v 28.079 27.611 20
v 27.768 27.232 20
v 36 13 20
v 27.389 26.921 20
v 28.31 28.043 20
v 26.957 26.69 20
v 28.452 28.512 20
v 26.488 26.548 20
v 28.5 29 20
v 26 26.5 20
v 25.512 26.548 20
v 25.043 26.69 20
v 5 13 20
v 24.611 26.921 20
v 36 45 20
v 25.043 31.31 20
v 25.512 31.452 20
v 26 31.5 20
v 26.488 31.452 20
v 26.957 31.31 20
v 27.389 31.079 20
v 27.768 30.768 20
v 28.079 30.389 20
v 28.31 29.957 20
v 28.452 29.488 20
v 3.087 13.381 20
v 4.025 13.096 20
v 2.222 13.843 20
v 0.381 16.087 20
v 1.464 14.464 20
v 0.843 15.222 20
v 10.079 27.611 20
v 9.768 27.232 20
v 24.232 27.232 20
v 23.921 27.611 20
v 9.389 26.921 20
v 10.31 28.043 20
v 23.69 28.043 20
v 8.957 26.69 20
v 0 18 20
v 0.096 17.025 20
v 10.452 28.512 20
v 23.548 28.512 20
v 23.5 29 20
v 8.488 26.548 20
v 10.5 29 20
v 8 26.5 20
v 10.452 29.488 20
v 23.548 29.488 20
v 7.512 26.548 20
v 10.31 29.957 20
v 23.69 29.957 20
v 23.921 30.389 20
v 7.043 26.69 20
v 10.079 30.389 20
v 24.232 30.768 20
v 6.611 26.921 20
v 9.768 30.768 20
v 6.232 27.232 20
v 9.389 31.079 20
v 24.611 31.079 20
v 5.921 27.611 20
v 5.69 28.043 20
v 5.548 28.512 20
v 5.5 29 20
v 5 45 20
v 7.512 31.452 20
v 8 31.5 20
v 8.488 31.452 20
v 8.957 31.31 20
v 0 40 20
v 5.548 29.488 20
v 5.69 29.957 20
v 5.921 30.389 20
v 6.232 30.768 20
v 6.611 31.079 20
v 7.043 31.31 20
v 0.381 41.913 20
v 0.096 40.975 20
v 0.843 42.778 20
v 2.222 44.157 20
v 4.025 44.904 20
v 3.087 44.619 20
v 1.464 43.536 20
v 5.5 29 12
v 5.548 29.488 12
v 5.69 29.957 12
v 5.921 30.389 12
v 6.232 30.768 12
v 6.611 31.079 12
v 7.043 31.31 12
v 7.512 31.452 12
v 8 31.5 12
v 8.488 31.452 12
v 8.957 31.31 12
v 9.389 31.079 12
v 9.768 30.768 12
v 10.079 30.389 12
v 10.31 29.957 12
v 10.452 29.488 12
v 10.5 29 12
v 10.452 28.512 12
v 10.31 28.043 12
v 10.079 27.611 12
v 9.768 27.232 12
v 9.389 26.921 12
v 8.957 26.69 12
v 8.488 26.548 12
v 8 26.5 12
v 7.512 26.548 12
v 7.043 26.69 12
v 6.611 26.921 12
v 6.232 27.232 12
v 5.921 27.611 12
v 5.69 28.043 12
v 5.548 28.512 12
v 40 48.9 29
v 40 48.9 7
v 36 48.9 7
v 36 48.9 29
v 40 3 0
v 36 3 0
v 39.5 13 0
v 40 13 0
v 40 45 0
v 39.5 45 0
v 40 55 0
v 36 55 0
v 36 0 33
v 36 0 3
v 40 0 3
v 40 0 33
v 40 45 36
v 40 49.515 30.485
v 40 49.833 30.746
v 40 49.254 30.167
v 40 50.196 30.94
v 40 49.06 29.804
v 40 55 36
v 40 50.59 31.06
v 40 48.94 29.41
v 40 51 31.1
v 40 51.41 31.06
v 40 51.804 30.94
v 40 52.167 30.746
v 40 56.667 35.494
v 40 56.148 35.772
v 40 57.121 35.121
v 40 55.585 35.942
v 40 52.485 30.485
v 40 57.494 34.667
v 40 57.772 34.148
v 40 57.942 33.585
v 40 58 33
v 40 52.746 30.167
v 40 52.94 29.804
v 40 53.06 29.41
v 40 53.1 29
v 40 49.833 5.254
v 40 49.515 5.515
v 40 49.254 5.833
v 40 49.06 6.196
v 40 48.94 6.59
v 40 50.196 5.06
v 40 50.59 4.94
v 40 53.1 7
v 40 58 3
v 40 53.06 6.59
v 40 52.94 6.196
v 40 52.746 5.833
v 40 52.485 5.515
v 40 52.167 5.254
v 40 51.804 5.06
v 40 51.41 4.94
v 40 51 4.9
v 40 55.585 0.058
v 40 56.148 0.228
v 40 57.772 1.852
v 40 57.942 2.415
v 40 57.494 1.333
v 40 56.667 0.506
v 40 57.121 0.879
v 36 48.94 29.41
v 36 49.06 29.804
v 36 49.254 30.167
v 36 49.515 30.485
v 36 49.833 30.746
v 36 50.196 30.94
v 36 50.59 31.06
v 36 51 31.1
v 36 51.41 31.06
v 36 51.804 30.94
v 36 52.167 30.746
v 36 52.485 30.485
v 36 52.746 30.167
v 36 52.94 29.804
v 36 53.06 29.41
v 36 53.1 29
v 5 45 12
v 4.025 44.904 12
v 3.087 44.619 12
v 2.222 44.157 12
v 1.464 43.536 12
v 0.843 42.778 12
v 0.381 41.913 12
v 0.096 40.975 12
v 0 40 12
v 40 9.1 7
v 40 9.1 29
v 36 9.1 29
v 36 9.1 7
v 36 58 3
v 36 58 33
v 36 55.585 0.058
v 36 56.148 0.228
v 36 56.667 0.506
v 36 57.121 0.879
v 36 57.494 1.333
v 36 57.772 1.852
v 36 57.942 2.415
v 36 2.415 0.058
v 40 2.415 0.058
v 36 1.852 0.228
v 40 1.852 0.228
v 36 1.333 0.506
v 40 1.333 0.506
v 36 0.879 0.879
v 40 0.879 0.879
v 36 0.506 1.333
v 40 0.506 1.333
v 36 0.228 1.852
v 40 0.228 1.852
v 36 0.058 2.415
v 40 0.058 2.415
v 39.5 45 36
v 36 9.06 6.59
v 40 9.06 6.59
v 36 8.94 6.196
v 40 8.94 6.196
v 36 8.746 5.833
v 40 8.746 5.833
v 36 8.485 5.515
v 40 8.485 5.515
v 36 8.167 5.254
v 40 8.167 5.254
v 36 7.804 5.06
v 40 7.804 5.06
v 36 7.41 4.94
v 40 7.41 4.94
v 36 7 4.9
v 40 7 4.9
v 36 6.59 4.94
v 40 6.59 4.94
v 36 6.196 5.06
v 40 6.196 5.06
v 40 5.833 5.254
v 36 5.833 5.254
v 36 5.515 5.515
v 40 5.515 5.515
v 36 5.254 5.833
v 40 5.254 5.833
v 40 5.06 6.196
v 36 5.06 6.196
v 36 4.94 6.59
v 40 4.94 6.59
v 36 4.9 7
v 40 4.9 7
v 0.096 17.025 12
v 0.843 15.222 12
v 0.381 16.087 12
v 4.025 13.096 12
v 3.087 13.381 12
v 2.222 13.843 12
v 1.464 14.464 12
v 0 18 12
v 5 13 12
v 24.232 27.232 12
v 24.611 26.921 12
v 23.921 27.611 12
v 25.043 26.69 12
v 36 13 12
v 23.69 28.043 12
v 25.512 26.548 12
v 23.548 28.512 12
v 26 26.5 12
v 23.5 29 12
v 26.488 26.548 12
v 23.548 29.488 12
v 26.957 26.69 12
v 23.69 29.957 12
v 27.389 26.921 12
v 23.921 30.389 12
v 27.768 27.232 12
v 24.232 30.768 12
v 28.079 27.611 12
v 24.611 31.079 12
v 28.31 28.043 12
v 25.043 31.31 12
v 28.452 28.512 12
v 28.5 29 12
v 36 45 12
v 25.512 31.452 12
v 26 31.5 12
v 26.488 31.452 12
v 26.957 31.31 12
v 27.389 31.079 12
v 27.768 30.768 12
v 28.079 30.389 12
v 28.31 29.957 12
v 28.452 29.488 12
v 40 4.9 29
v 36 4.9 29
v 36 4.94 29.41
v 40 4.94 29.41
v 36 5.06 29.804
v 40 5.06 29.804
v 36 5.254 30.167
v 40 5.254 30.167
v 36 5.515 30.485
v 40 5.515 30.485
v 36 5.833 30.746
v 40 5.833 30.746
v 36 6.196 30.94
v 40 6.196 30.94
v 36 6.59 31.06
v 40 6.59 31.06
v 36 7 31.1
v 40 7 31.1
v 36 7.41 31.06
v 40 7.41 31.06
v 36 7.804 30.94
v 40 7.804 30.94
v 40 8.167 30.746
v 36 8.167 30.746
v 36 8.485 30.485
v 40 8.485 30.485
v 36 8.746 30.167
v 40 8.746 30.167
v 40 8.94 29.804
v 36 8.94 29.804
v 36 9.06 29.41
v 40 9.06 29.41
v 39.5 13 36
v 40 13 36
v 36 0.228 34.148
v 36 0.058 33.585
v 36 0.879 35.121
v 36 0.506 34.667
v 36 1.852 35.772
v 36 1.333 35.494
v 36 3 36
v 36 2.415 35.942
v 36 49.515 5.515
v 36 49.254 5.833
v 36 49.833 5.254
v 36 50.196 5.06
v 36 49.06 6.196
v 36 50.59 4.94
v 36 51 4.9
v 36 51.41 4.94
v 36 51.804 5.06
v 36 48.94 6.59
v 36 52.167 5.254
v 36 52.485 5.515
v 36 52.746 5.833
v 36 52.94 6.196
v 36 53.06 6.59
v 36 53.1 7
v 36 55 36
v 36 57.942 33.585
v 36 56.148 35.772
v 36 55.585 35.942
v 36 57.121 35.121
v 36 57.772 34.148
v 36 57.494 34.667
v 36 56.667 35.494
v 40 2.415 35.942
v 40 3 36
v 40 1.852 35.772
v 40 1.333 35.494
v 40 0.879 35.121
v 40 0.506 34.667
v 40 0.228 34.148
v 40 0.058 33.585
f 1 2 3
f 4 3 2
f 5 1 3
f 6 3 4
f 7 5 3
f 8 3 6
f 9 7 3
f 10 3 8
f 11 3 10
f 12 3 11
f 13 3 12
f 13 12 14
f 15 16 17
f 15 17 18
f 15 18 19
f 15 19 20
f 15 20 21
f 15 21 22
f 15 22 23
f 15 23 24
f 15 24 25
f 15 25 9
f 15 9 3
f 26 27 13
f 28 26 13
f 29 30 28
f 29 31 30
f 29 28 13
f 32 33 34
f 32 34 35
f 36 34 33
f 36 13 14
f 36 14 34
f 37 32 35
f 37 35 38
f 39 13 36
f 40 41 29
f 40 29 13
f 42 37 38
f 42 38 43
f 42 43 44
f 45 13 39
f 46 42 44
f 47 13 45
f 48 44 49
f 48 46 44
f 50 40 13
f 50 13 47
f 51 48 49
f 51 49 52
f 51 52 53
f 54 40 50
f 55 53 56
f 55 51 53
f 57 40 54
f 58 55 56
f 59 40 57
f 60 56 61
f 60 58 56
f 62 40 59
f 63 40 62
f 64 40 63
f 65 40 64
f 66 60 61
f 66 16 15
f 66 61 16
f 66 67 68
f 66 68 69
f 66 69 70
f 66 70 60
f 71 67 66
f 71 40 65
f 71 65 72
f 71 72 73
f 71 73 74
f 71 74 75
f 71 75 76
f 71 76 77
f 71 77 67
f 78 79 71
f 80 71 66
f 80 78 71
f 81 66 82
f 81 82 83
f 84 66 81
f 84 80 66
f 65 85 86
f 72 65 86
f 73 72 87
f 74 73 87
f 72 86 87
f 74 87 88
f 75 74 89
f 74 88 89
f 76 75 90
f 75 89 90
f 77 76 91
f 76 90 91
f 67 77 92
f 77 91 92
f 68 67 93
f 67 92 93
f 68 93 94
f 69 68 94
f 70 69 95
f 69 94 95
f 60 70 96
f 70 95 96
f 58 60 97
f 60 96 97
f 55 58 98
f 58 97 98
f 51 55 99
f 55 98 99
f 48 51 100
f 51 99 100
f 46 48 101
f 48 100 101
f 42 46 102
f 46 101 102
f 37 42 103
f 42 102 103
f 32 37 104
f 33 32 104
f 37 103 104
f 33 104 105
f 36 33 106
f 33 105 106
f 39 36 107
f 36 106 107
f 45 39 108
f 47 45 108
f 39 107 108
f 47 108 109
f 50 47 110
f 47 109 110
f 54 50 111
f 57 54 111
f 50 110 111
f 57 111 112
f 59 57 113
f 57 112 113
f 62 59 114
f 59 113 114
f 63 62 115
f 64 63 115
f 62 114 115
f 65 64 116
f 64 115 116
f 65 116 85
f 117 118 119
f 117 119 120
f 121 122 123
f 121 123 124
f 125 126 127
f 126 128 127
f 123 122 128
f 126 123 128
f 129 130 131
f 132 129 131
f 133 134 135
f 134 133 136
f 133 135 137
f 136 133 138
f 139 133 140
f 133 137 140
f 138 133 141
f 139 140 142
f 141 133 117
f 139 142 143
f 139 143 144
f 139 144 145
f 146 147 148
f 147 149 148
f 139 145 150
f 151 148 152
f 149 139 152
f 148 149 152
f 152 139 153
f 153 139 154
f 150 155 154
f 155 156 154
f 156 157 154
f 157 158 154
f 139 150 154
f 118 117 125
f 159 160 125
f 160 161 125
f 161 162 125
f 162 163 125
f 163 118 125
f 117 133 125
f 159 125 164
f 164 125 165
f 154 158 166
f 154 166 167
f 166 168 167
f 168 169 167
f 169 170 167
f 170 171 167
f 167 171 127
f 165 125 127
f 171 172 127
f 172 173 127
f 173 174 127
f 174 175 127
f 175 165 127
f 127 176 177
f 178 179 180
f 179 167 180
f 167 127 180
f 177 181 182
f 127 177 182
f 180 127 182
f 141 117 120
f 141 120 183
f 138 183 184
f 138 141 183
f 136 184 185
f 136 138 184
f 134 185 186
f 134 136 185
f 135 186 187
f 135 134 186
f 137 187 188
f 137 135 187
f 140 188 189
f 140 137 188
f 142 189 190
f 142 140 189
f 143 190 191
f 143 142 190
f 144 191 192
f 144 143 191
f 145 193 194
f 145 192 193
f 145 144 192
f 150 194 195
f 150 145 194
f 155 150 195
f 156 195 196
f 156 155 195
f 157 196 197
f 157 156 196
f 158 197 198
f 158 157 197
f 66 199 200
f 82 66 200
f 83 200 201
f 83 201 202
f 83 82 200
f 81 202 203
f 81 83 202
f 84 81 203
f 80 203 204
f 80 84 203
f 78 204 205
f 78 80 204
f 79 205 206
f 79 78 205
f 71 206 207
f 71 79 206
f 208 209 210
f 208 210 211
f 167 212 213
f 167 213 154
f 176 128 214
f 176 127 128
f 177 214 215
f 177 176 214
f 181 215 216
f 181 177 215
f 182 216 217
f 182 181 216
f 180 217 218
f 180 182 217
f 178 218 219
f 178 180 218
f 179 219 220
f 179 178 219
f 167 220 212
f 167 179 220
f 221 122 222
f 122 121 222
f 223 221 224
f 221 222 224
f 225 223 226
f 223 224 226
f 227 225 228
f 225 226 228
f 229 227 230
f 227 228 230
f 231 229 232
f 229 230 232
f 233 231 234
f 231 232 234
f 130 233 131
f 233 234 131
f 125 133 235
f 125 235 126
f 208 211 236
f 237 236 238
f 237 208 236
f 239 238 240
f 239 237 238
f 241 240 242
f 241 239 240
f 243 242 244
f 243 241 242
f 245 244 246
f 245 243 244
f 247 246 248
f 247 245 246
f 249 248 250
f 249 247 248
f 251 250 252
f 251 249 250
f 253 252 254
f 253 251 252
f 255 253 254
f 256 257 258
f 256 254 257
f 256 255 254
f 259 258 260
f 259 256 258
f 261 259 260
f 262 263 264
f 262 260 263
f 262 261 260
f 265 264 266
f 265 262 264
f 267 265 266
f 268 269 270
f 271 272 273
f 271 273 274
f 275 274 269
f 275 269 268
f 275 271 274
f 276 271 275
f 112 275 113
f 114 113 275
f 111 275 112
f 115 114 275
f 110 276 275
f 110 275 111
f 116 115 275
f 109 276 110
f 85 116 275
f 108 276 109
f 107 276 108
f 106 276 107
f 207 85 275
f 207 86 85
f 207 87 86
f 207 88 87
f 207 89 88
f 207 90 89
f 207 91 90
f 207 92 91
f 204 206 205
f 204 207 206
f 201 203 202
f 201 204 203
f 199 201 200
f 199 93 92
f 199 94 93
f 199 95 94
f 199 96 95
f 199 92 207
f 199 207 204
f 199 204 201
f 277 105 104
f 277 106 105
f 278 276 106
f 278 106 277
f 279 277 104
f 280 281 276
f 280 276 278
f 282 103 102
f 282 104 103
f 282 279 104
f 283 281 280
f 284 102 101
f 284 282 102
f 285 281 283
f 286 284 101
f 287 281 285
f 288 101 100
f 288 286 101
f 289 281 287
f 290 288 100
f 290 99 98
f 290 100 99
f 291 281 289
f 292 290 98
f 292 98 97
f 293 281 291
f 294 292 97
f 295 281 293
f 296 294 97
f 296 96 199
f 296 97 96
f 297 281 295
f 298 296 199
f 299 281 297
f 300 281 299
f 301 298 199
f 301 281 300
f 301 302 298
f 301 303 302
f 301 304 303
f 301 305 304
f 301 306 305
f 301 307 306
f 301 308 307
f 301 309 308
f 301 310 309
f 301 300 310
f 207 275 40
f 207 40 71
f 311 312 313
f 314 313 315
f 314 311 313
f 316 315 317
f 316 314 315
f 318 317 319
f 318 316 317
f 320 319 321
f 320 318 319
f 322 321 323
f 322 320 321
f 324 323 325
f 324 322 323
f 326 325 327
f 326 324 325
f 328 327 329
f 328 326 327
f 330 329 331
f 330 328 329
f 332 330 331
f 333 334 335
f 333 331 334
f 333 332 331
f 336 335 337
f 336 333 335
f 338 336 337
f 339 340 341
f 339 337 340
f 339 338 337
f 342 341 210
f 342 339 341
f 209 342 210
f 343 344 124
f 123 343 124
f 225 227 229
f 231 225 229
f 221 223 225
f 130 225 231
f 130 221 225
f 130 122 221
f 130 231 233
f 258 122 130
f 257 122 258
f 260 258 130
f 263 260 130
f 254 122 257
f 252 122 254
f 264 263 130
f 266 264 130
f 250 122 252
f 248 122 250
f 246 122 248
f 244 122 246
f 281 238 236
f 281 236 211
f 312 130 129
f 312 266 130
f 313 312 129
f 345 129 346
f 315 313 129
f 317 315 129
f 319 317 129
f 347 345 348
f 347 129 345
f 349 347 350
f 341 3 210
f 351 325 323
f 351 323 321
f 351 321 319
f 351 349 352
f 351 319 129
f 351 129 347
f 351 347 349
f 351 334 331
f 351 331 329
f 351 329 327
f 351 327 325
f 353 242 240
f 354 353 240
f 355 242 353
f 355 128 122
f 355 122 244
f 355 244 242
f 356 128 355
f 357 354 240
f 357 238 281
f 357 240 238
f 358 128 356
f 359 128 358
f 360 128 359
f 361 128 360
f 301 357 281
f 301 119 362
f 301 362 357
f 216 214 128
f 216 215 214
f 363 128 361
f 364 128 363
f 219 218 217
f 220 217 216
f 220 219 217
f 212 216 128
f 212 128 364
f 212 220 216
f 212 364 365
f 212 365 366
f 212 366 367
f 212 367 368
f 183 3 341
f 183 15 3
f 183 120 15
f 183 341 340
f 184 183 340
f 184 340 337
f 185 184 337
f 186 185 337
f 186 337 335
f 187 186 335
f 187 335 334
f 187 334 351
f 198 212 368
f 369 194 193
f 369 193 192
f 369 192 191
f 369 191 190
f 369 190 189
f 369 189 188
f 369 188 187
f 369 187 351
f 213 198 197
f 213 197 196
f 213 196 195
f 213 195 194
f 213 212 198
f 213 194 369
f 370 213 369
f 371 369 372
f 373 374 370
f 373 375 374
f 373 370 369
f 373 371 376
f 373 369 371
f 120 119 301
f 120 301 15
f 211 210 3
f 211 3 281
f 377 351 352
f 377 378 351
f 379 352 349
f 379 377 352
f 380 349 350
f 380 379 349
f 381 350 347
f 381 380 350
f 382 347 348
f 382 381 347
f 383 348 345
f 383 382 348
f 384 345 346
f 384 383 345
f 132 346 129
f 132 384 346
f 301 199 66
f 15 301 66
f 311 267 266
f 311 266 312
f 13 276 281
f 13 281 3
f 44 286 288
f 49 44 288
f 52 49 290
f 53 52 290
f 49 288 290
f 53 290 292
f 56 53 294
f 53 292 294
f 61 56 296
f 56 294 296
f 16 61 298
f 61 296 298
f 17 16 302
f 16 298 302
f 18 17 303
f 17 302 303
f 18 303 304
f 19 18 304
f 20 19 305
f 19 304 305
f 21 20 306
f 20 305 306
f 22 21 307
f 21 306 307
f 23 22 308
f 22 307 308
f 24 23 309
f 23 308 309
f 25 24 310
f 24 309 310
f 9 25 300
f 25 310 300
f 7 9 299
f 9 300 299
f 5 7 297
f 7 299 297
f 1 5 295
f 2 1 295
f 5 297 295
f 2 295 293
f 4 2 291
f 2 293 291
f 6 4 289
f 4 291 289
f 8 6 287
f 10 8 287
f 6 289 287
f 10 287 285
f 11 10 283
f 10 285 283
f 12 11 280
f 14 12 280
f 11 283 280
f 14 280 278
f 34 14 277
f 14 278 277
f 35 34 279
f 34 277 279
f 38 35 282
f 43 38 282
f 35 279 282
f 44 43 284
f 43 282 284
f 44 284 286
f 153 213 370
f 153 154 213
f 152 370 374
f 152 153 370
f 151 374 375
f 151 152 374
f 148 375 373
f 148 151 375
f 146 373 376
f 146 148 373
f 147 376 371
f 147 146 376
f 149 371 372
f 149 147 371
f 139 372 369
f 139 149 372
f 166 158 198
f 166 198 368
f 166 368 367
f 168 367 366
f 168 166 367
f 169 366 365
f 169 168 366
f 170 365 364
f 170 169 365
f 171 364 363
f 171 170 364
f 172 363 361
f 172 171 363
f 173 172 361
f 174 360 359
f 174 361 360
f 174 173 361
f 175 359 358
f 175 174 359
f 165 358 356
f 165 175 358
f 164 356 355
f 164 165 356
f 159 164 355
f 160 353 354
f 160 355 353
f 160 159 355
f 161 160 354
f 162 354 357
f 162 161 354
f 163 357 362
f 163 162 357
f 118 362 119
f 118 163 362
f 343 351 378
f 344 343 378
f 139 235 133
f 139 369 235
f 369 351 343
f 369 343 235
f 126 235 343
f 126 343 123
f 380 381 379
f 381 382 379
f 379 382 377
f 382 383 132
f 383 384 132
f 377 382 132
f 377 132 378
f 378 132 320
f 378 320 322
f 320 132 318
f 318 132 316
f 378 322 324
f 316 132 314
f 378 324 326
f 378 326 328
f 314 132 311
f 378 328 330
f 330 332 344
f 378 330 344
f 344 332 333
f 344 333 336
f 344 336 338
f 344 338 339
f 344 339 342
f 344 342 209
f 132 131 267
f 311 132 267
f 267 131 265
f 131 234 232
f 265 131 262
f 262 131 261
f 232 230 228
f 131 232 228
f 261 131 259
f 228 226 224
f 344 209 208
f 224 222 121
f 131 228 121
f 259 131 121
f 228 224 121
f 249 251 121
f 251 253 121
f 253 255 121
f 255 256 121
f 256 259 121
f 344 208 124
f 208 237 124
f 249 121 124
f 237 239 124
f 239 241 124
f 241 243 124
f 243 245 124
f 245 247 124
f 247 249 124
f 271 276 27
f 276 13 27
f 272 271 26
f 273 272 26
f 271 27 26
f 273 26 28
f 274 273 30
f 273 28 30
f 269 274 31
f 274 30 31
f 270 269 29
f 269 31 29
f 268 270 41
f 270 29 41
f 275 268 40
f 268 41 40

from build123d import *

# Parameters (mm, degrees)
SKETCH_1_W             = 40
SKETCH_1_H             = 58
EXTRUDE_2_DEPTH        = 36
SKETCH_2_W             = 36
SKETCH_2_H             = 13
CUT_EXTRUDE_1_DEPTH    = 36
SKETCH_3_W             = 16
SKETCH_3_H             = 32
CUT_EXTRUDE_2_DEPTH    = 36
CUT_EXTRUDE_3_DEPTH    = 5
HOLE_WIZARD_M6_1_D     = 5
HOLE_WIZARD_M6_1_DEPTH = 15
HOLE_WIZARD_M6_1_TIP   = 1.502151548
CUT_EXTRUDE_START      = -36
SKETCH_8_W             = 12
SKETCH_8_H             = 32
CUT_EXTRUDE_4_DEPTH    = 36
FILLET_1_R             = 3
FILLET_2_R             = 5
SKETCH_9_W             = 36
SKETCH_9_H             = 32
CUT_EXTRUDE_5_DEPTH    = 0.5


with BuildPart() as part:
    # 草图1 → 凸台-拉伸2 (new body)
    with BuildSketch(Plane.XY):
        with Locations((20, 29)):
            Rectangle(SKETCH_1_W, SKETCH_1_H)
    extrude(amount=EXTRUDE_2_DEPTH)

    # 草图2 → 切除-拉伸1 (cut)
    with BuildSketch(Plane.ZY):
        with Locations((18, 51.5)):
            Rectangle(SKETCH_2_W, SKETCH_2_H)
        with Locations((18, 6.5)):
            Rectangle(SKETCH_2_W, SKETCH_2_H)
    extrude(amount=-CUT_EXTRUDE_1_DEPTH, mode=Mode.SUBTRACT)

    # 草图3 → 切除-拉伸2 (cut)
    with BuildSketch(Plane.ZY):
        with Locations((28, 29)):
            Rectangle(SKETCH_3_W, SKETCH_3_H)
    extrude(amount=-CUT_EXTRUDE_2_DEPTH, mode=Mode.SUBTRACT)

    # 草图4 → 切除-拉伸3 (cut)
    with BuildSketch(Plane(origin=(40, 0, 0), x_dir=(0, 0, -1), z_dir=(1, 0, 0))):
        with BuildLine():
            Line((-29, 53.1), (-7, 53.1))
            ThreePointArc((-7, 53.1), (-4.9, 51), (-7, 48.9))
            Line((-7, 48.9), (-29, 48.9))
            ThreePointArc((-29, 48.9), (-31.1, 51), (-29, 53.1))
        make_face()
        with BuildLine():
            Line((-29, 9.1), (-7, 9.1))
            ThreePointArc((-7, 9.1), (-4.9, 7), (-7, 4.9))
            Line((-7, 4.9), (-29, 4.9))
            ThreePointArc((-29, 4.9), (-31.1, 7), (-29, 9.1))
        make_face()
    extrude(amount=-CUT_EXTRUDE_3_DEPTH, mode=Mode.SUBTRACT)

    # M6 螺纹孔1
    with Locations(Plane.XY.offset(20)):
        with Locations((26, 29), (8, 29)):
            Hole(HOLE_WIZARD_M6_1_D / 2, depth=HOLE_WIZARD_M6_1_DEPTH)
            with Locations((0, 0, -(HOLE_WIZARD_M6_1_DEPTH + HOLE_WIZARD_M6_1_TIP / 2))):  # 118° drill point
                Cone(0, HOLE_WIZARD_M6_1_D / 2, HOLE_WIZARD_M6_1_TIP, mode=Mode.SUBTRACT)

    # 草图8 → 切除-拉伸4 (cut)
    with BuildSketch(Plane.ZY.offset(CUT_EXTRUDE_START)):
        with Locations((6, 29)):
            Rectangle(SKETCH_8_W, SKETCH_8_H)
    extrude(amount=CUT_EXTRUDE_4_DEPTH, mode=Mode.SUBTRACT)

    # 圆角1
    fillet_1_edges = [part.edges().sort_by_distance(p)[0] for p in [
        (38, 58, 36),
        (38, 0, 0),
        (38, 0, 36),
        (38, 58, 0),
    ]]
    fillet(fillet_1_edges, radius=FILLET_1_R)

    # 圆角2
    fillet_2_edges = [part.edges().sort_by_distance(p)[0] for p in [
        (0, 45, 16),
        (0, 13, 16),
    ]]
    fillet(fillet_2_edges, radius=FILLET_2_R)

    # 草图9 → 切除-拉伸5 (cut)
    with BuildSketch(Plane(origin=(40, 0, 0), x_dir=(0, 0, -1), z_dir=(1, 0, 0))):
        with Locations((-18, 29)):
            Rectangle(SKETCH_9_W, SKETCH_9_H)
    extrude(amount=-CUT_EXTRUDE_5_DEPTH, mode=Mode.SUBTRACT)


solid = part.part
